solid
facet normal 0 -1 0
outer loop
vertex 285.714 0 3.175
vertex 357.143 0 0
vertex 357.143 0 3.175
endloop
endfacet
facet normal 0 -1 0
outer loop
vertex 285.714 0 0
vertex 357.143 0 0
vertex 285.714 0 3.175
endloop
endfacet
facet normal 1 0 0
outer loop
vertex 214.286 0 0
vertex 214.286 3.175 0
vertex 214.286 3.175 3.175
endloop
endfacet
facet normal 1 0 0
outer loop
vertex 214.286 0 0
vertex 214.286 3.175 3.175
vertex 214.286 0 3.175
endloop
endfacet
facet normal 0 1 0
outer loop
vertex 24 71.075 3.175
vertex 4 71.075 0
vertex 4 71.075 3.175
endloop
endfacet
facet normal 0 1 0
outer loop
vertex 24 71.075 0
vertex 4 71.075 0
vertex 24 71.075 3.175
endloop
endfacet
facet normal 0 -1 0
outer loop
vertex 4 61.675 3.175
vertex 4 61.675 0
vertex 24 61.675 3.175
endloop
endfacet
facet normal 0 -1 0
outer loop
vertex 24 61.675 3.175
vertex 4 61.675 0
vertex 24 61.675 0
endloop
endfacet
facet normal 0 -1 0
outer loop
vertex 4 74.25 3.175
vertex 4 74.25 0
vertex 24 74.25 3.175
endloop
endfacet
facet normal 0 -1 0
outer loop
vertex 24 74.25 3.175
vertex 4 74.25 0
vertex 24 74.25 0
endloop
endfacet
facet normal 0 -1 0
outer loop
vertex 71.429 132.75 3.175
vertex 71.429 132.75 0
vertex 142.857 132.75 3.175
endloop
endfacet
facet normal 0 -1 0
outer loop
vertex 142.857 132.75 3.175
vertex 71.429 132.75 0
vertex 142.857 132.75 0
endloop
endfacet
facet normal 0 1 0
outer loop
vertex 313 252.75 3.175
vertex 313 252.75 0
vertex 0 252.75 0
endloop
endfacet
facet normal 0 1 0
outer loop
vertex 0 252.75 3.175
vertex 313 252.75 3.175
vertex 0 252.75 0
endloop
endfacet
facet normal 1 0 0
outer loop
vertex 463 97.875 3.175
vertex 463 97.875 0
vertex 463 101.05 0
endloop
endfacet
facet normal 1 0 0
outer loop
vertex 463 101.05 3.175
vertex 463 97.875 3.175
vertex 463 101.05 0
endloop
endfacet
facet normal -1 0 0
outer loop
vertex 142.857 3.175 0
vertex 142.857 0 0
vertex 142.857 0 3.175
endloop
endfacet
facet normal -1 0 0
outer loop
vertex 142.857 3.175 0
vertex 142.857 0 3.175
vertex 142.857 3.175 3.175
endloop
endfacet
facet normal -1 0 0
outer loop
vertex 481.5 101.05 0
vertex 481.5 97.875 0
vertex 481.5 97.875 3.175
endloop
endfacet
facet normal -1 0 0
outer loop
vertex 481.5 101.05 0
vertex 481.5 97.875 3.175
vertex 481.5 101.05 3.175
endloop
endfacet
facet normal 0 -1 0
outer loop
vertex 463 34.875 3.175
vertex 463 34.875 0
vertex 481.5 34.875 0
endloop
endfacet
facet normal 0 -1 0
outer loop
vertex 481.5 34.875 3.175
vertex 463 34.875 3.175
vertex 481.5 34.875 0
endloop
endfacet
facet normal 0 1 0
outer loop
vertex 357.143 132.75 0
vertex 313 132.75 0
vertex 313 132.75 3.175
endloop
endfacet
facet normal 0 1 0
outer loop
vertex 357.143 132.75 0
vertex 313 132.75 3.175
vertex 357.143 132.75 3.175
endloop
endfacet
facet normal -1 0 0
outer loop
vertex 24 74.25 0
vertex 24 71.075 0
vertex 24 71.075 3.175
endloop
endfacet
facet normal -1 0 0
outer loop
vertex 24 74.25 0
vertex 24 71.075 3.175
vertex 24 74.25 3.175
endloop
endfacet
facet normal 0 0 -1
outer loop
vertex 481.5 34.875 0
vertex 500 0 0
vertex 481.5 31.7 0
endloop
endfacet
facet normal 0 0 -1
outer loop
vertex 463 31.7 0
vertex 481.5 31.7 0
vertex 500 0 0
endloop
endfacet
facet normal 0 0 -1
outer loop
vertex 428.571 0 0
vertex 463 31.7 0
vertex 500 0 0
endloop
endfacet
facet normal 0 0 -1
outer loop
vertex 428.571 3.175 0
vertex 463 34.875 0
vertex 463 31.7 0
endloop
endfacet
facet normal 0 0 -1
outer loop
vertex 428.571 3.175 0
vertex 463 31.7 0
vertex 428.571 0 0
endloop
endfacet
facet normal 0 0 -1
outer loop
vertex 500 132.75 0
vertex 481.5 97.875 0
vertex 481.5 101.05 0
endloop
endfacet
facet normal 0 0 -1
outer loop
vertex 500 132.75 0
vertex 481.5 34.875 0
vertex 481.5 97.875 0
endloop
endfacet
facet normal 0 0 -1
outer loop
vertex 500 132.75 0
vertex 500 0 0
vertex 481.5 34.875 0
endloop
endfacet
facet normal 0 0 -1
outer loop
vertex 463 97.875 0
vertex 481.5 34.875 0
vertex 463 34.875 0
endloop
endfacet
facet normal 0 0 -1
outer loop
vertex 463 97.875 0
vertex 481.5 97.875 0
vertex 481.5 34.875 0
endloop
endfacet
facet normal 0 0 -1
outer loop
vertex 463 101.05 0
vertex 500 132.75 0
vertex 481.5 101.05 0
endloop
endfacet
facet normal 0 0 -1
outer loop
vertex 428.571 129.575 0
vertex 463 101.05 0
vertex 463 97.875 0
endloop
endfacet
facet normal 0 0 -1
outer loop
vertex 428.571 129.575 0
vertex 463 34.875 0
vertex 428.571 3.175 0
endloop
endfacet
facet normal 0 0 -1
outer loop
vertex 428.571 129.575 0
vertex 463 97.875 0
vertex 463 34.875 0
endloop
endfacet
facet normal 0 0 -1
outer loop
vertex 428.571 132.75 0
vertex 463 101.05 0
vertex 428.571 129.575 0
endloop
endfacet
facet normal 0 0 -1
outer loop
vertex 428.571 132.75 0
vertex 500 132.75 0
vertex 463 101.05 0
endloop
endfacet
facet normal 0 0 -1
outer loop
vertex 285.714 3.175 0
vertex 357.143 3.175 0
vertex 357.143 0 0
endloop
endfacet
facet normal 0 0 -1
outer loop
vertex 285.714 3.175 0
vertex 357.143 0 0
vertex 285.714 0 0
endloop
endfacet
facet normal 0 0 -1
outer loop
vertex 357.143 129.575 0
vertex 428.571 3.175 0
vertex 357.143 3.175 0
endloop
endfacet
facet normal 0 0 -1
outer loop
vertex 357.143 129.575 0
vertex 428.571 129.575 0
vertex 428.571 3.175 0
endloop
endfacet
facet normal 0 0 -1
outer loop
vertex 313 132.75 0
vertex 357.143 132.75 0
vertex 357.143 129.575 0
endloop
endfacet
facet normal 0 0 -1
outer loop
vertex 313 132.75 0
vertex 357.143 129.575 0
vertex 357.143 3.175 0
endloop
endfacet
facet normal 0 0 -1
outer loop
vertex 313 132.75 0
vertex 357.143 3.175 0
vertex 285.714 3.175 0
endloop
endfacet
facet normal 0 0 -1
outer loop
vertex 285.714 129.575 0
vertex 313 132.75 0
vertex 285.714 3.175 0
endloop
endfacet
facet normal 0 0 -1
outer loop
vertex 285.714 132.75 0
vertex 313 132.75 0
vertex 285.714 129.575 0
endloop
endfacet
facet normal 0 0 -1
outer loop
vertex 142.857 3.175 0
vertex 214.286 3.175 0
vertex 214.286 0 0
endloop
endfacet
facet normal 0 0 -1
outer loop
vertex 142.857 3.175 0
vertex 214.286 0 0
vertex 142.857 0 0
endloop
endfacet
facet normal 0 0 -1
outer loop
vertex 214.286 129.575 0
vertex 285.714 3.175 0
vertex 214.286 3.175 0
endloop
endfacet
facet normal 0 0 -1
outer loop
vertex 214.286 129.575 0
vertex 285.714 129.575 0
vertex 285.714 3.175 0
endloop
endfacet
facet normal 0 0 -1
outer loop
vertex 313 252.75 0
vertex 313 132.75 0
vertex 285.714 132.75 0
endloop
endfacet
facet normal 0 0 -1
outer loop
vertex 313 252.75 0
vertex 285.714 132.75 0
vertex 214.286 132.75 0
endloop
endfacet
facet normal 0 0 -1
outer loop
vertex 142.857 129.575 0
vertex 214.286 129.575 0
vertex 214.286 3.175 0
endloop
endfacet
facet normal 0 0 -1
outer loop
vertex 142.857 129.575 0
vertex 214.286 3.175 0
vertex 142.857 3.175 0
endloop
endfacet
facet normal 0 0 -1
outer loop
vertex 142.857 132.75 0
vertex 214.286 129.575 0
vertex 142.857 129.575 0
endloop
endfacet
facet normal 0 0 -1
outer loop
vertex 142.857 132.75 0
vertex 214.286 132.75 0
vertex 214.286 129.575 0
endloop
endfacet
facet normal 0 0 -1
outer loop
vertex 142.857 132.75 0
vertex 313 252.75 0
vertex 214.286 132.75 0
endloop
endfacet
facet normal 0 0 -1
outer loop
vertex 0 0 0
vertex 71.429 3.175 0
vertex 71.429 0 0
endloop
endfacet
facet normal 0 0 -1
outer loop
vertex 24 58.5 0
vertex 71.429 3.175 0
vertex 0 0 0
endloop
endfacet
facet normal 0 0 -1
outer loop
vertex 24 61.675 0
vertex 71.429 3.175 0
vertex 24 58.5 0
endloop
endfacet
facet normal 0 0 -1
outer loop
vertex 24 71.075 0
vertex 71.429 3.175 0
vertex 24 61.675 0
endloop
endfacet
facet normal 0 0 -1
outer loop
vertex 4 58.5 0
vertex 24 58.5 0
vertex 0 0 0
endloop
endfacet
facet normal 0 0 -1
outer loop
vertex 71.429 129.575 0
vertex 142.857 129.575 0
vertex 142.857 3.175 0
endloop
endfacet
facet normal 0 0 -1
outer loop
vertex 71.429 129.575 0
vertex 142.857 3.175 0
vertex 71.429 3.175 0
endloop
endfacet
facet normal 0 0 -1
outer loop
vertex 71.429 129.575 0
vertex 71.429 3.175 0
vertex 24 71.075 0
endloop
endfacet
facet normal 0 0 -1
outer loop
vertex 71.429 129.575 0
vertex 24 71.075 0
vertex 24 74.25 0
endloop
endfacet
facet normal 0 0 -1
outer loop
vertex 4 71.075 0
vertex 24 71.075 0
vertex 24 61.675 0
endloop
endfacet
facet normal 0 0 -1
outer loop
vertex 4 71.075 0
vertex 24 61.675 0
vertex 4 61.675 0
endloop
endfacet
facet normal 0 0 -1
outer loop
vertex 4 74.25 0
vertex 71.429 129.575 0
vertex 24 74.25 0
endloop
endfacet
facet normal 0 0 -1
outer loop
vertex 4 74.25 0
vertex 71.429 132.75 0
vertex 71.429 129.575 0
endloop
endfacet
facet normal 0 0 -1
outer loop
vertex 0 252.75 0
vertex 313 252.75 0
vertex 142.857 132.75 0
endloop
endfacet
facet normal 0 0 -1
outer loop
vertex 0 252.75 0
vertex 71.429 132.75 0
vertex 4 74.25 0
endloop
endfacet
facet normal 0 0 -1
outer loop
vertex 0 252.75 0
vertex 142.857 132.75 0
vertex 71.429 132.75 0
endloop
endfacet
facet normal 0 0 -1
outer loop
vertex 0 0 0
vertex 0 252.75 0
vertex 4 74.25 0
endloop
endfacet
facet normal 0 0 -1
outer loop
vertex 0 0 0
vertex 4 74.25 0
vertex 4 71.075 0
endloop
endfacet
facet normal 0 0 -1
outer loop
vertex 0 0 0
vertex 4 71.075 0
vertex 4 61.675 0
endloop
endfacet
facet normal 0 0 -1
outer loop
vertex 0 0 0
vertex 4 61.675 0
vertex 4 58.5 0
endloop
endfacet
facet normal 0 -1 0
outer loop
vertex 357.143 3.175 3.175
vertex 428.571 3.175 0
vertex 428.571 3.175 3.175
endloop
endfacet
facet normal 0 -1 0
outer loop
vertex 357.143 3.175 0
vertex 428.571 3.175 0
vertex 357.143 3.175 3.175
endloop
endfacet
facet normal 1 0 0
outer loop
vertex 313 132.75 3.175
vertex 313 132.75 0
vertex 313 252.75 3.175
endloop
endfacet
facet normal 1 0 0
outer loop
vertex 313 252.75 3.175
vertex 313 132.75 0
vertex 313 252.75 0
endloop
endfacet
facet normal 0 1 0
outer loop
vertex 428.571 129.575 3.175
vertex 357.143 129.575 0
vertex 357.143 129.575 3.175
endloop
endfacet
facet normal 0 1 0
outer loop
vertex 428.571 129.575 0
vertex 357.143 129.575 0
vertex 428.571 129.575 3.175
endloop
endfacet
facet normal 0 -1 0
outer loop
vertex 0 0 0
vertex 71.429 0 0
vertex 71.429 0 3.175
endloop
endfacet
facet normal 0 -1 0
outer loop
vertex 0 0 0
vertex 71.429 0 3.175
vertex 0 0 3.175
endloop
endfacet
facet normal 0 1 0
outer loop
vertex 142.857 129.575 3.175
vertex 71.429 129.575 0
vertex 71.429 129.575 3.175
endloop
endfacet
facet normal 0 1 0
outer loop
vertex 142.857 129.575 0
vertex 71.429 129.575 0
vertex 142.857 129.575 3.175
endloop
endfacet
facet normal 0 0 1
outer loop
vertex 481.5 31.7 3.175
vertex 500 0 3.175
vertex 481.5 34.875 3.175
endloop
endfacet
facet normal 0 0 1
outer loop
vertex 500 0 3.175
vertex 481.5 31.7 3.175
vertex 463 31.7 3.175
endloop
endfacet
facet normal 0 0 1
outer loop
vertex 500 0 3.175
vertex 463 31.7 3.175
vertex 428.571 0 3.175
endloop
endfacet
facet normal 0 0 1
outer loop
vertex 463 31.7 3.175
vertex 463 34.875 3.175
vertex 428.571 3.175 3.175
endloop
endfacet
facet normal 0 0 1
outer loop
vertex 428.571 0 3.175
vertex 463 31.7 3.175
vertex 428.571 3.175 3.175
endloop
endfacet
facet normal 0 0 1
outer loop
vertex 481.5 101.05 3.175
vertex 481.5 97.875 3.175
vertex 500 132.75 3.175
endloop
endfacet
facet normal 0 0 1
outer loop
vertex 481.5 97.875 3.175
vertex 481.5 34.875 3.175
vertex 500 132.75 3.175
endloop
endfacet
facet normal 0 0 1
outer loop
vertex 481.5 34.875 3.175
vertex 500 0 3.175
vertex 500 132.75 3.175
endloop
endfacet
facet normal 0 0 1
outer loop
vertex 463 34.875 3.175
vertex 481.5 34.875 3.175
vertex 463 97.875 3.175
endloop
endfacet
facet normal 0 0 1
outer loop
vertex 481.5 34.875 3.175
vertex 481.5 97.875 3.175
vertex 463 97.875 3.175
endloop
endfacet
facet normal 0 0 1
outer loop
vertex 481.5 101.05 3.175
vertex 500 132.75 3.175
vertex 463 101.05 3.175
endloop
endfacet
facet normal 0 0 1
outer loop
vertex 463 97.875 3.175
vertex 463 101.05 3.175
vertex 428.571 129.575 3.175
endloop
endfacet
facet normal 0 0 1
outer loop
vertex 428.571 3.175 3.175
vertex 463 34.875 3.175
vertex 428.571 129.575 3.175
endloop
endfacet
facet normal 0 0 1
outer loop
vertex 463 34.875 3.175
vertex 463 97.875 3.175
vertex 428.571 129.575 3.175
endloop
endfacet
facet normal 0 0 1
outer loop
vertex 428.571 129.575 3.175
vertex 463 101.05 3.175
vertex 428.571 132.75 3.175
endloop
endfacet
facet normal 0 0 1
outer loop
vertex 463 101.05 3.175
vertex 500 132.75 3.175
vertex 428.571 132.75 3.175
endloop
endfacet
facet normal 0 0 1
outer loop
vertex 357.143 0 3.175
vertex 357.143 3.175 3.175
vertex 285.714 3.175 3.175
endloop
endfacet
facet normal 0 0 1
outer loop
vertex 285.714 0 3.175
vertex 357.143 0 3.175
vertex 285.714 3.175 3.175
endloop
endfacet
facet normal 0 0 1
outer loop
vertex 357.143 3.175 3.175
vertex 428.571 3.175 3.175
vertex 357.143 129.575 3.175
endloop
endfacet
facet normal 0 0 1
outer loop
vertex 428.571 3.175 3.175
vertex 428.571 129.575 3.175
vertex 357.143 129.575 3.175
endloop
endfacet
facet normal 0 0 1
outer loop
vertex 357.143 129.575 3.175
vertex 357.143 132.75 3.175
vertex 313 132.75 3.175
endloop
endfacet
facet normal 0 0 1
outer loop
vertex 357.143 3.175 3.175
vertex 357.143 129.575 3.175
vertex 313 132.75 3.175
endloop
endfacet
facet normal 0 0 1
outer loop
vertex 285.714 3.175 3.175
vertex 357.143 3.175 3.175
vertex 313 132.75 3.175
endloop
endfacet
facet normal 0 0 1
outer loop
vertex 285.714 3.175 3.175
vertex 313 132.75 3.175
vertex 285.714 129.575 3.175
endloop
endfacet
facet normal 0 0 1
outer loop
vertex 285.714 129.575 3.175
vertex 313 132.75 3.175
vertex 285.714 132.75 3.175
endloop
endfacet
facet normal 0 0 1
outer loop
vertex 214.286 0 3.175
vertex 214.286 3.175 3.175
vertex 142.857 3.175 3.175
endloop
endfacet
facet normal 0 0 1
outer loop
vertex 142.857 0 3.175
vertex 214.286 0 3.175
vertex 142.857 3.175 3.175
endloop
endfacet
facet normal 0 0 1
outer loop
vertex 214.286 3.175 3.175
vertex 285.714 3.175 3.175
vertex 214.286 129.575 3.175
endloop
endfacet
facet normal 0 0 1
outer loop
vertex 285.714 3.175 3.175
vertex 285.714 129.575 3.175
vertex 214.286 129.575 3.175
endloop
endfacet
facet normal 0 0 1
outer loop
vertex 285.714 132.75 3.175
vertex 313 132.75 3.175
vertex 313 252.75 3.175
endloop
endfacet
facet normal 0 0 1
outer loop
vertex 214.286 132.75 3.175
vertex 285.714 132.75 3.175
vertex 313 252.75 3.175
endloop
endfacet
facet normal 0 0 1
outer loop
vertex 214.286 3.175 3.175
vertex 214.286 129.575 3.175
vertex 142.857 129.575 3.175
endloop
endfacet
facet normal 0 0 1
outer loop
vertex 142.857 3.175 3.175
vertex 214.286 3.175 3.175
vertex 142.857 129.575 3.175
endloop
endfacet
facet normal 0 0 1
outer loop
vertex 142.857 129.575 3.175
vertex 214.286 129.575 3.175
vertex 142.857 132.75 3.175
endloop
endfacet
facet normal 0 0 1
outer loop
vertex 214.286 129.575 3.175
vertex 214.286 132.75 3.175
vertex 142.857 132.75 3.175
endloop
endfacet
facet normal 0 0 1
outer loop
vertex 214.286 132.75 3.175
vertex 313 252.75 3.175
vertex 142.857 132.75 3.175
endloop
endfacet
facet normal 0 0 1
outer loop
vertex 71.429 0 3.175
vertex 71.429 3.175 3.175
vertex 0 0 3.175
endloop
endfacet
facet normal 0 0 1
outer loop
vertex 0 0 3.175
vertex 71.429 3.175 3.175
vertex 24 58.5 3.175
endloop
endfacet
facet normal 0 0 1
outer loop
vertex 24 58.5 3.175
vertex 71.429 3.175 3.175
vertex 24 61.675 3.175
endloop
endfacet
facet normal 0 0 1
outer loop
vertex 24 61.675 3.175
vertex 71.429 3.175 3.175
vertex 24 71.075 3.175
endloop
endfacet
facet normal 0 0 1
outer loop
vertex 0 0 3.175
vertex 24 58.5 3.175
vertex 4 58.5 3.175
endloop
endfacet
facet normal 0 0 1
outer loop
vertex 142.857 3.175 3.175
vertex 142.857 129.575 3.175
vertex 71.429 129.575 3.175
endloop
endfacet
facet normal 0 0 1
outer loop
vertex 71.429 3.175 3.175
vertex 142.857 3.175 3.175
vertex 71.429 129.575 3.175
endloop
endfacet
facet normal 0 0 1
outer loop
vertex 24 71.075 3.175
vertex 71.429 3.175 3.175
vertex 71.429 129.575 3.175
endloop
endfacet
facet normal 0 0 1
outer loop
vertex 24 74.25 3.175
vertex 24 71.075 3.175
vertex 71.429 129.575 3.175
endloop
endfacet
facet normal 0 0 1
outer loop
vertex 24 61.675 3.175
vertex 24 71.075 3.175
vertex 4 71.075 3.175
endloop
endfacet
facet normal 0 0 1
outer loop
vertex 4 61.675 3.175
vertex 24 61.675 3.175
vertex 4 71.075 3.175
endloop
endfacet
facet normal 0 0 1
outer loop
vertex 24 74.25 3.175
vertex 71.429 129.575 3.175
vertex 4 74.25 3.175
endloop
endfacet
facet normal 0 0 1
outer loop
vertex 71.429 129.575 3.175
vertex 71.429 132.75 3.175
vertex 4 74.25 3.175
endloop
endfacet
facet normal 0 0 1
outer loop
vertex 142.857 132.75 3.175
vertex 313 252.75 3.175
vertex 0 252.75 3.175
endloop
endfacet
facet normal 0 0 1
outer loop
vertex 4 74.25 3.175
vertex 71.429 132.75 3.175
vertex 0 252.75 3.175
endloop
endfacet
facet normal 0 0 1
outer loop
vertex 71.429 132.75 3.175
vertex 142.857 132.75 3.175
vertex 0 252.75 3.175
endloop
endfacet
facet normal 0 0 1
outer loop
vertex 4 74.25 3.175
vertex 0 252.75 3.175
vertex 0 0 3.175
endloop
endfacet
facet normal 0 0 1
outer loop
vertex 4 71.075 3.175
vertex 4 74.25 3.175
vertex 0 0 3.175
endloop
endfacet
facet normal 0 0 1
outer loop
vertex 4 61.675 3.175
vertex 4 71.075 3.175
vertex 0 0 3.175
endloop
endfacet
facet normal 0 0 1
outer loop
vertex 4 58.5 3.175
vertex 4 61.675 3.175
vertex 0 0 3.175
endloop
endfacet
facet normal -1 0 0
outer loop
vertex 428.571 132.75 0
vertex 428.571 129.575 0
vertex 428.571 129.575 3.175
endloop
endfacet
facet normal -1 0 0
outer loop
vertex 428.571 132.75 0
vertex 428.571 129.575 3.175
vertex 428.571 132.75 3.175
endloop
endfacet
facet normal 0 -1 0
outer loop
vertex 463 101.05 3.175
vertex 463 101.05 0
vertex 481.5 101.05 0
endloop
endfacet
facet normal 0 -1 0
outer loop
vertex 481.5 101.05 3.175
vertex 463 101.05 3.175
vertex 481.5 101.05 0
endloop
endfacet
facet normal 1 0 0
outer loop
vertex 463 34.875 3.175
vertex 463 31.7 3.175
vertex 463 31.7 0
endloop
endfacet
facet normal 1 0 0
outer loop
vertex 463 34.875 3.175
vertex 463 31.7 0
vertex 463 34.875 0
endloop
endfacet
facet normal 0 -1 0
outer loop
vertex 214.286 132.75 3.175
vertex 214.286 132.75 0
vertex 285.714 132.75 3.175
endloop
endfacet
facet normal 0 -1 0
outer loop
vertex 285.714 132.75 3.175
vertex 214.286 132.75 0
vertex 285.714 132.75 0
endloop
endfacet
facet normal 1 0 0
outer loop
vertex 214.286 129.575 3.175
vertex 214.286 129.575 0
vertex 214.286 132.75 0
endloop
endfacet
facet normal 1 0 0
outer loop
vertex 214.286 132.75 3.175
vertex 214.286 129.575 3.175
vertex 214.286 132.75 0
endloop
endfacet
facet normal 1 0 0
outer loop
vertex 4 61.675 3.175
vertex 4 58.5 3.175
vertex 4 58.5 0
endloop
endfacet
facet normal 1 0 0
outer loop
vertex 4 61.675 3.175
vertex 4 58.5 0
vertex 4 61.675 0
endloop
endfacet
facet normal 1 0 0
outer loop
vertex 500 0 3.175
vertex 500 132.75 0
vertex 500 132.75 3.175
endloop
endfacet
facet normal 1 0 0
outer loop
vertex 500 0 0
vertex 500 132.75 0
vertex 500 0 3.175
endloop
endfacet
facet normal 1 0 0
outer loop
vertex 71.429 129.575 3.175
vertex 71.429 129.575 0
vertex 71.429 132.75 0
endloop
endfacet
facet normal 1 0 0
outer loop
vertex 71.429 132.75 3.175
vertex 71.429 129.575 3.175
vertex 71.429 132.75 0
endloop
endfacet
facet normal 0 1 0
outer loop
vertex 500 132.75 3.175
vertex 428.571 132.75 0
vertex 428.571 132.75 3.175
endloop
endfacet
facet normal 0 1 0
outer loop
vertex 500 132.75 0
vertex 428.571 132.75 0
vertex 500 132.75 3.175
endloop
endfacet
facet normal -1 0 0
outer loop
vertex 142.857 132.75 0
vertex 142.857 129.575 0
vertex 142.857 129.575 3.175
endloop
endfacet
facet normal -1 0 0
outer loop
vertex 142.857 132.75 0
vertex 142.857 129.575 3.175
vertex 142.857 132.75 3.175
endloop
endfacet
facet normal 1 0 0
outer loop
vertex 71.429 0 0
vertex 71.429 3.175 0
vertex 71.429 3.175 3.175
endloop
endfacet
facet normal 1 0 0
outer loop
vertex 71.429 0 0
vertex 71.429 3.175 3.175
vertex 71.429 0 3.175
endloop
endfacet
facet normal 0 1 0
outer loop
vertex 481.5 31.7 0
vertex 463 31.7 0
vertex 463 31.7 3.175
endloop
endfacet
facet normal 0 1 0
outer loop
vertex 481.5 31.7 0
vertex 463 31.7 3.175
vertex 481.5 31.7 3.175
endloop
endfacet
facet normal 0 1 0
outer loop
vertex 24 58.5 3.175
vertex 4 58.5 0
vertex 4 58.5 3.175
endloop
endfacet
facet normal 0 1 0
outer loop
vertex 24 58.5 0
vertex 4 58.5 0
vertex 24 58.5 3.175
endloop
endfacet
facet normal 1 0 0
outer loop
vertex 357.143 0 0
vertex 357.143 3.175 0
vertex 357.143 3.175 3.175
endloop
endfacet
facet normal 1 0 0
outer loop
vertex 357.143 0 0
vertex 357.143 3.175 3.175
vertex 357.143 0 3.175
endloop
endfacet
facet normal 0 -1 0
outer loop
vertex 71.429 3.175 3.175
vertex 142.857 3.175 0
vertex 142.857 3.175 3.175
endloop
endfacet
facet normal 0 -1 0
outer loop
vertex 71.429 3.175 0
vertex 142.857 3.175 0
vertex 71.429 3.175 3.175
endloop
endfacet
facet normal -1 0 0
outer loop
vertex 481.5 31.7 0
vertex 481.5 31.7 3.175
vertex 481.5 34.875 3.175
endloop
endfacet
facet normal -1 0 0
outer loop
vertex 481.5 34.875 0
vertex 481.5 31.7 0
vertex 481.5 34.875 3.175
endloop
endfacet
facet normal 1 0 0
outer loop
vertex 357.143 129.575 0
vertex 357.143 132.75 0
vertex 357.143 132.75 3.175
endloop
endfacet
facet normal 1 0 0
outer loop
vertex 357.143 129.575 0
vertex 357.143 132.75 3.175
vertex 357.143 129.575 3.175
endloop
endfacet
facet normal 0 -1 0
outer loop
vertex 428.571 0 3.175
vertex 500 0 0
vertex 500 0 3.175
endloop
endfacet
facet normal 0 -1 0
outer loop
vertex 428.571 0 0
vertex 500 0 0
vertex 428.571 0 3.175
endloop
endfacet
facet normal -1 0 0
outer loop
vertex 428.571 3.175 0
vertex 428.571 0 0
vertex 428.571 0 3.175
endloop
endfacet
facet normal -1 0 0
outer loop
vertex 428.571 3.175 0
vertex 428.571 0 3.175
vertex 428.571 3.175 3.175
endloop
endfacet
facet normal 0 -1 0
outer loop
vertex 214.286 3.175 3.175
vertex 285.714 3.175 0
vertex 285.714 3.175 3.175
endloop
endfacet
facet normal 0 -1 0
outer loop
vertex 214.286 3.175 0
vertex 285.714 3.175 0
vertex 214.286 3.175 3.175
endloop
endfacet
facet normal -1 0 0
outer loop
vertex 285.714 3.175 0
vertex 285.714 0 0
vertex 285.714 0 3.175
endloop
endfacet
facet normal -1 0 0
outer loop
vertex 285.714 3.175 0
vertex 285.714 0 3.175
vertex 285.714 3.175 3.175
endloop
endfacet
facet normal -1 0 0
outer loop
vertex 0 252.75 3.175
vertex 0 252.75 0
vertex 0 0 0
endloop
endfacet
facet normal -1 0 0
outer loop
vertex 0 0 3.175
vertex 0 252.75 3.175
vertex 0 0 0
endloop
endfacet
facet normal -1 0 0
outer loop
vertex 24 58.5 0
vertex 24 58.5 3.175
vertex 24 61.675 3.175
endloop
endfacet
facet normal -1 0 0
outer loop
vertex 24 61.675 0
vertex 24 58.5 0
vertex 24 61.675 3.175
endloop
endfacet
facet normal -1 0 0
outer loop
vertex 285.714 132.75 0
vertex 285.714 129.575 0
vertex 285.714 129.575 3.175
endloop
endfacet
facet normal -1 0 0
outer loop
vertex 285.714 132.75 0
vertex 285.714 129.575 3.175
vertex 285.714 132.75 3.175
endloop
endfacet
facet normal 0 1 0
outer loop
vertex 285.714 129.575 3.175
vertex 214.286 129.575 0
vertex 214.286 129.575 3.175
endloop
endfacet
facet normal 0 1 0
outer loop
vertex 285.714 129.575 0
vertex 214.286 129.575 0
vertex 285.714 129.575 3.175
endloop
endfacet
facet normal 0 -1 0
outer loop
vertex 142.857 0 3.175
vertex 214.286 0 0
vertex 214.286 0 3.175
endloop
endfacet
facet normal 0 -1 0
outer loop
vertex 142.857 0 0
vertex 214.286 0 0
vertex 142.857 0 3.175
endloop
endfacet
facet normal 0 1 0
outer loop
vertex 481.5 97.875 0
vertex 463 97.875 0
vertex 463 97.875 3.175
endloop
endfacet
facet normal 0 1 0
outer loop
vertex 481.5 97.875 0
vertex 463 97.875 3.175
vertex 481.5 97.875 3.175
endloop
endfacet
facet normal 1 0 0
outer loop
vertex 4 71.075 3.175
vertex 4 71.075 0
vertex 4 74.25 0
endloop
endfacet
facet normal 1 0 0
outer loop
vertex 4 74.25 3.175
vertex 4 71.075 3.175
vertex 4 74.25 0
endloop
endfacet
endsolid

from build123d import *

# Parameters (mm, degrees)
SKETCH1_W           = 71.428571428
SKETCH1_H           = 3.175
SKETCH1_W_2         = 20
SKETCH1_W_3         = 18.5
BOSS_EXTRUDE1_DEPTH = 3.175


with BuildPart() as part:
    # Sketch1 → Boss-Extrude1 (new body)
    with BuildSketch(Plane.XY):
        Polygon((0, 0), (0, 132.75), (0, 252.75), (278.222222222, 252.75), (313, 252.75), (313, 228.115), (313, 132.75), (357.142857143, 132.75), (357.142857143, 129.575), (428.571428571, 129.575), (428.571428571, 132.75), (500, 132.75), (500, 0), (428.571428571, 0), (428.571428571, 3.175), (357.142857143, 3.175), (357.142857143, 0), (285.714285714, 0), (285.714285714, 3.175), (214.285714286, 3.175), (214.285714286, 0), (142.857142857, 0), (142.857142857, 3.175), (71.428571429, 3.175), (71.428571429, 0), align=None)
        with Locations((107.142857143, 131.1625)):
            Rectangle(SKETCH1_W, SKETCH1_H, mode=Mode.SUBTRACT)
        with Locations((250, 131.1625)):
            Rectangle(SKETCH1_W, SKETCH1_H, mode=Mode.SUBTRACT)
        with Locations((14, 60.0875)):
            Rectangle(SKETCH1_W_2, SKETCH1_H, mode=Mode.SUBTRACT)
        with Locations((14, 72.6625)):
            Rectangle(SKETCH1_W_2, SKETCH1_H, mode=Mode.SUBTRACT)
        with Locations((472.25, 33.2875)):
            Rectangle(SKETCH1_W_3, SKETCH1_H, mode=Mode.SUBTRACT)
        with Locations((472.25, 99.4625)):
            Rectangle(SKETCH1_W_3, SKETCH1_H, mode=Mode.SUBTRACT)
    extrude(amount=BOSS_EXTRUDE1_DEPTH)


solid = part.part
